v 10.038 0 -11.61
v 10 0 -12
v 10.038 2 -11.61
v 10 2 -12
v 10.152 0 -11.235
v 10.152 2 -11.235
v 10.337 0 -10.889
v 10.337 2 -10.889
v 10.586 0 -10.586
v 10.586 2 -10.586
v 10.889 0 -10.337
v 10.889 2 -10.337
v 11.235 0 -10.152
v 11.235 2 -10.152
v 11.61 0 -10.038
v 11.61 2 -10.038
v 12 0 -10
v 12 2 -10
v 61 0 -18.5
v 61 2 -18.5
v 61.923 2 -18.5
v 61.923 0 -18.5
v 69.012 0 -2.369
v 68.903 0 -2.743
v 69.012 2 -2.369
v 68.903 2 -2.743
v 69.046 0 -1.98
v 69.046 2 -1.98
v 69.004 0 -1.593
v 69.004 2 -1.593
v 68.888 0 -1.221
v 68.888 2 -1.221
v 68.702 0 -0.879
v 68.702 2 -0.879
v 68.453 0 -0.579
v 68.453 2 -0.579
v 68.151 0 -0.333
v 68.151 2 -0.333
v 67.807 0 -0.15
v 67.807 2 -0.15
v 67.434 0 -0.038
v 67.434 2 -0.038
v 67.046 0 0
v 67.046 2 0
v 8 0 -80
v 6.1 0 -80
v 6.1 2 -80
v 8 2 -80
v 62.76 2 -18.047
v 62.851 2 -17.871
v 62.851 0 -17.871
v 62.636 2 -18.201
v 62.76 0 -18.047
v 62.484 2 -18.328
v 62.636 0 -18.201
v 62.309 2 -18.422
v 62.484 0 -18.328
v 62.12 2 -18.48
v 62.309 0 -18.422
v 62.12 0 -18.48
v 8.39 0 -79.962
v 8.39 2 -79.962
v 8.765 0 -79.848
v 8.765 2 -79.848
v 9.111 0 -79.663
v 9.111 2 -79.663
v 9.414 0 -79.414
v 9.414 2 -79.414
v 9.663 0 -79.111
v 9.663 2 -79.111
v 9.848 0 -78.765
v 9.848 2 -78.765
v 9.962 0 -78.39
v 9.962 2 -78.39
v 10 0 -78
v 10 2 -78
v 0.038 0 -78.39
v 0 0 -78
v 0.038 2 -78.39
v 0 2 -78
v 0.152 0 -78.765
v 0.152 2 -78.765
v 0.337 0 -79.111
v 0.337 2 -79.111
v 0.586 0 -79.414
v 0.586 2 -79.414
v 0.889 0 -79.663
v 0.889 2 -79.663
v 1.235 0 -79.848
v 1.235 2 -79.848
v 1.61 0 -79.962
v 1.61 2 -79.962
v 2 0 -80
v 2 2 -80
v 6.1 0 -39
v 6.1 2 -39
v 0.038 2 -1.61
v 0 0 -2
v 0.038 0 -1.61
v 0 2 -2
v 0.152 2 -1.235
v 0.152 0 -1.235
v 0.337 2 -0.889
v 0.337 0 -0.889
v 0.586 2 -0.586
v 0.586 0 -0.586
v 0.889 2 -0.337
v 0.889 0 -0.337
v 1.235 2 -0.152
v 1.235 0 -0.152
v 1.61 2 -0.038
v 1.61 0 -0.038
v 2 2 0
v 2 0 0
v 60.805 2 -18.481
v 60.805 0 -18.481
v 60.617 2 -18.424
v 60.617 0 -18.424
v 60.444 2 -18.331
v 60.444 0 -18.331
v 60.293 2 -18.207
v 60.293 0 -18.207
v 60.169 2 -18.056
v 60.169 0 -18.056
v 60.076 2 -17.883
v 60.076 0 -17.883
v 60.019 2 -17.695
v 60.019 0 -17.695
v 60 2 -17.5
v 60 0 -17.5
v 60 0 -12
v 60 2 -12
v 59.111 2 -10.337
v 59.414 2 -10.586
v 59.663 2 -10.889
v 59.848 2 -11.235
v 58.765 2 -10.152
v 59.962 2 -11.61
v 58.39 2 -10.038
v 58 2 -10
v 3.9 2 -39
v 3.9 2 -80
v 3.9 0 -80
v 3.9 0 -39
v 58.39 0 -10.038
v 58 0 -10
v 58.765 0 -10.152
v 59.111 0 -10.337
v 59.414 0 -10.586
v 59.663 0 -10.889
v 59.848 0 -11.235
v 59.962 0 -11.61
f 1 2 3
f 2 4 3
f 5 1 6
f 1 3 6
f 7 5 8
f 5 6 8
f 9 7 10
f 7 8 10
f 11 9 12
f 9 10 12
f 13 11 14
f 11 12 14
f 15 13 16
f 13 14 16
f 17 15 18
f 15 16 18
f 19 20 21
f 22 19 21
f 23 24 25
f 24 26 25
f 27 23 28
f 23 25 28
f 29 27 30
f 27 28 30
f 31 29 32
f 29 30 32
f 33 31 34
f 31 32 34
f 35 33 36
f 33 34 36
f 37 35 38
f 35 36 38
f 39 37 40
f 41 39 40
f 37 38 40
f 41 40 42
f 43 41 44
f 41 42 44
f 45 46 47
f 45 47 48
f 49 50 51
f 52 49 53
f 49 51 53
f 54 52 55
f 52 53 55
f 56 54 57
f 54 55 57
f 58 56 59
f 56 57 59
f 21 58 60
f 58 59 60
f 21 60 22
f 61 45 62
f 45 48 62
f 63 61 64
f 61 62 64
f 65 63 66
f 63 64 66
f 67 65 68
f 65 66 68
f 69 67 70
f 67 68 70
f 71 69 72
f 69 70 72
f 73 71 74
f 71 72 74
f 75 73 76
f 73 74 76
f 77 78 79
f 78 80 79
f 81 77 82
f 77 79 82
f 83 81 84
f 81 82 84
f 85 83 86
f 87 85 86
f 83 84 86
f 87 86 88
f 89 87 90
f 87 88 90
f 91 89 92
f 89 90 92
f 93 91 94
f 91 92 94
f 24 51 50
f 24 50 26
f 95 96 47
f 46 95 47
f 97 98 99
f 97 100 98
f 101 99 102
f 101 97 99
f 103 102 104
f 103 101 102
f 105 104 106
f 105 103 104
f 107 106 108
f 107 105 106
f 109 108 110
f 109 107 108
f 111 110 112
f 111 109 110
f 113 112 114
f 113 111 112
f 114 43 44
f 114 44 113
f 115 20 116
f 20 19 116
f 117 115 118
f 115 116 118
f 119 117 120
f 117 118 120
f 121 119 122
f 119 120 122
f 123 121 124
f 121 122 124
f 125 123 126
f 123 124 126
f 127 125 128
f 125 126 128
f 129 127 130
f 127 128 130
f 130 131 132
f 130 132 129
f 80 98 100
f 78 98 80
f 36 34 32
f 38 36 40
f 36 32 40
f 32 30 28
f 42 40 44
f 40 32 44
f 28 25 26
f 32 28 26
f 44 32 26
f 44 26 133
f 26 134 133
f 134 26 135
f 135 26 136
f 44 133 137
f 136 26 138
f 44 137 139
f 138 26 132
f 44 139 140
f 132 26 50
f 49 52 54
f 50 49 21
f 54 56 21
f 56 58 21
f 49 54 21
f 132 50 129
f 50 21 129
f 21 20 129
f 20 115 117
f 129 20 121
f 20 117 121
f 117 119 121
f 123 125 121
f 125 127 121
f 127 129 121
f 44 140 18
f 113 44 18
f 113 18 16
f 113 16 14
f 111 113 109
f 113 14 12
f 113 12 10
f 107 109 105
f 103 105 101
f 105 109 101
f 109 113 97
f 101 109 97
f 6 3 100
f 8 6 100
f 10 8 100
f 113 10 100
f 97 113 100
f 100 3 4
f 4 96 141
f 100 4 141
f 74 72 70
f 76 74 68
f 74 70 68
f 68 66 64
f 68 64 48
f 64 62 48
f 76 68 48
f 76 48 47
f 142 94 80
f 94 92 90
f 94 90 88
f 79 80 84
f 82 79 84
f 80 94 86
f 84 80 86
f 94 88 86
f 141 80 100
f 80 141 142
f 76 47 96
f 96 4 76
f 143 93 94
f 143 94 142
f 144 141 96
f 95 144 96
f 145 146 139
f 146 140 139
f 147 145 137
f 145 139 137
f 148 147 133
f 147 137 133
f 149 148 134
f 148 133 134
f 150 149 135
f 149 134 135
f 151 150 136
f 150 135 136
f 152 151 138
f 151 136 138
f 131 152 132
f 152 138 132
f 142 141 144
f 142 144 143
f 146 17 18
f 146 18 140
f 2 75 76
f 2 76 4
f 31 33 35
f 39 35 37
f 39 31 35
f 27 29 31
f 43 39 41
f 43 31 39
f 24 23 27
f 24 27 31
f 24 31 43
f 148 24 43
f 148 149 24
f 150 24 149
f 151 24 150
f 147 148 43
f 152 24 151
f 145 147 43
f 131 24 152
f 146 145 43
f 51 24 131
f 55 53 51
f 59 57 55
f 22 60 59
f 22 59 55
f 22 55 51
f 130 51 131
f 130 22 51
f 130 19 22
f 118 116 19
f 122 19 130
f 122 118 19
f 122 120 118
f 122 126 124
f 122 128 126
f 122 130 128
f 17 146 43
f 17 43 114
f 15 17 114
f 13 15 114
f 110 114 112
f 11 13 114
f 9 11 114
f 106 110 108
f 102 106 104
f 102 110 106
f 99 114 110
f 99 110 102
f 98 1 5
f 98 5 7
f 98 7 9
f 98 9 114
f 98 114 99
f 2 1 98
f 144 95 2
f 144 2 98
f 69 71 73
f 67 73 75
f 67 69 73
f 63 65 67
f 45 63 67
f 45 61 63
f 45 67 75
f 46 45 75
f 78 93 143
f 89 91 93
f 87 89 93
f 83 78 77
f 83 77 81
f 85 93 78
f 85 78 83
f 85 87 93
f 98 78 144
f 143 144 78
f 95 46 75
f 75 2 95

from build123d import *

# Parameters (mm, degrees)
BOSS_EXTRUDE1_DEPTH = 2
FILLET1_R           = 2
CUT_EXTRUDE1_DEPTH  = 106.694564726
FILLET2_R           = 1
SKETCH3_W           = 2.2
SKETCH3_H           = 41
CUT_EXTRUDE2_DEPTH  = 10


with BuildPart() as part:
    # Sketch1 → Boss-Extrude1 (new body)
    with BuildSketch(Plane(origin=(0, 0, 0), x_dir=(1, 0, 0), z_dir=(0, 1, 0))):
        Polygon((0, 0), (0, 80), (10, 80), (10, 10), (60, 10), (60, 25), (70, 0), align=None)
    extrude(amount=BOSS_EXTRUDE1_DEPTH)

    # Fillet1
    fillet1_edges = [part.edges().sort_by_distance(p)[0] for p in [
        (0, 1, 0),
        (0, 1, -80),
        (10, 1, -80),
        (10, 1, -10),
        (60, 1, -10),
        (70, 1, 0),
    ]]
    fillet(fillet1_edges, radius=FILLET1_R)

    # Sketch2 → Cut-Extrude1 (cut, through all)
    with BuildSketch(Plane(origin=(0, 2, 0), x_dir=(1, 0, 0), z_dir=(0, 1, 0))):
        Polygon((60, 18.5), (62.6, 18.5), (60, 25), align=None)
    extrude(amount=-CUT_EXTRUDE1_DEPTH, mode=Mode.SUBTRACT)

    # Fillet2
    fillet2_edges = [part.edges().sort_by_distance(p)[0] for p in [
        (60, 1, -18.5),
        (62.6, 1, -18.5),
    ]]
    fillet(fillet2_edges, radius=FILLET2_R)

    # Sketch3 → Cut-Extrude2 (cut)
    with BuildSketch(Plane(origin=(0, 2, 0), x_dir=(1, 0, 0), z_dir=(0, 1, 0))):
        with Locations((5, 59.5)):
            Rectangle(SKETCH3_W, SKETCH3_H)
    extrude(amount=-CUT_EXTRUDE2_DEPTH, mode=Mode.SUBTRACT)


solid = part.part
